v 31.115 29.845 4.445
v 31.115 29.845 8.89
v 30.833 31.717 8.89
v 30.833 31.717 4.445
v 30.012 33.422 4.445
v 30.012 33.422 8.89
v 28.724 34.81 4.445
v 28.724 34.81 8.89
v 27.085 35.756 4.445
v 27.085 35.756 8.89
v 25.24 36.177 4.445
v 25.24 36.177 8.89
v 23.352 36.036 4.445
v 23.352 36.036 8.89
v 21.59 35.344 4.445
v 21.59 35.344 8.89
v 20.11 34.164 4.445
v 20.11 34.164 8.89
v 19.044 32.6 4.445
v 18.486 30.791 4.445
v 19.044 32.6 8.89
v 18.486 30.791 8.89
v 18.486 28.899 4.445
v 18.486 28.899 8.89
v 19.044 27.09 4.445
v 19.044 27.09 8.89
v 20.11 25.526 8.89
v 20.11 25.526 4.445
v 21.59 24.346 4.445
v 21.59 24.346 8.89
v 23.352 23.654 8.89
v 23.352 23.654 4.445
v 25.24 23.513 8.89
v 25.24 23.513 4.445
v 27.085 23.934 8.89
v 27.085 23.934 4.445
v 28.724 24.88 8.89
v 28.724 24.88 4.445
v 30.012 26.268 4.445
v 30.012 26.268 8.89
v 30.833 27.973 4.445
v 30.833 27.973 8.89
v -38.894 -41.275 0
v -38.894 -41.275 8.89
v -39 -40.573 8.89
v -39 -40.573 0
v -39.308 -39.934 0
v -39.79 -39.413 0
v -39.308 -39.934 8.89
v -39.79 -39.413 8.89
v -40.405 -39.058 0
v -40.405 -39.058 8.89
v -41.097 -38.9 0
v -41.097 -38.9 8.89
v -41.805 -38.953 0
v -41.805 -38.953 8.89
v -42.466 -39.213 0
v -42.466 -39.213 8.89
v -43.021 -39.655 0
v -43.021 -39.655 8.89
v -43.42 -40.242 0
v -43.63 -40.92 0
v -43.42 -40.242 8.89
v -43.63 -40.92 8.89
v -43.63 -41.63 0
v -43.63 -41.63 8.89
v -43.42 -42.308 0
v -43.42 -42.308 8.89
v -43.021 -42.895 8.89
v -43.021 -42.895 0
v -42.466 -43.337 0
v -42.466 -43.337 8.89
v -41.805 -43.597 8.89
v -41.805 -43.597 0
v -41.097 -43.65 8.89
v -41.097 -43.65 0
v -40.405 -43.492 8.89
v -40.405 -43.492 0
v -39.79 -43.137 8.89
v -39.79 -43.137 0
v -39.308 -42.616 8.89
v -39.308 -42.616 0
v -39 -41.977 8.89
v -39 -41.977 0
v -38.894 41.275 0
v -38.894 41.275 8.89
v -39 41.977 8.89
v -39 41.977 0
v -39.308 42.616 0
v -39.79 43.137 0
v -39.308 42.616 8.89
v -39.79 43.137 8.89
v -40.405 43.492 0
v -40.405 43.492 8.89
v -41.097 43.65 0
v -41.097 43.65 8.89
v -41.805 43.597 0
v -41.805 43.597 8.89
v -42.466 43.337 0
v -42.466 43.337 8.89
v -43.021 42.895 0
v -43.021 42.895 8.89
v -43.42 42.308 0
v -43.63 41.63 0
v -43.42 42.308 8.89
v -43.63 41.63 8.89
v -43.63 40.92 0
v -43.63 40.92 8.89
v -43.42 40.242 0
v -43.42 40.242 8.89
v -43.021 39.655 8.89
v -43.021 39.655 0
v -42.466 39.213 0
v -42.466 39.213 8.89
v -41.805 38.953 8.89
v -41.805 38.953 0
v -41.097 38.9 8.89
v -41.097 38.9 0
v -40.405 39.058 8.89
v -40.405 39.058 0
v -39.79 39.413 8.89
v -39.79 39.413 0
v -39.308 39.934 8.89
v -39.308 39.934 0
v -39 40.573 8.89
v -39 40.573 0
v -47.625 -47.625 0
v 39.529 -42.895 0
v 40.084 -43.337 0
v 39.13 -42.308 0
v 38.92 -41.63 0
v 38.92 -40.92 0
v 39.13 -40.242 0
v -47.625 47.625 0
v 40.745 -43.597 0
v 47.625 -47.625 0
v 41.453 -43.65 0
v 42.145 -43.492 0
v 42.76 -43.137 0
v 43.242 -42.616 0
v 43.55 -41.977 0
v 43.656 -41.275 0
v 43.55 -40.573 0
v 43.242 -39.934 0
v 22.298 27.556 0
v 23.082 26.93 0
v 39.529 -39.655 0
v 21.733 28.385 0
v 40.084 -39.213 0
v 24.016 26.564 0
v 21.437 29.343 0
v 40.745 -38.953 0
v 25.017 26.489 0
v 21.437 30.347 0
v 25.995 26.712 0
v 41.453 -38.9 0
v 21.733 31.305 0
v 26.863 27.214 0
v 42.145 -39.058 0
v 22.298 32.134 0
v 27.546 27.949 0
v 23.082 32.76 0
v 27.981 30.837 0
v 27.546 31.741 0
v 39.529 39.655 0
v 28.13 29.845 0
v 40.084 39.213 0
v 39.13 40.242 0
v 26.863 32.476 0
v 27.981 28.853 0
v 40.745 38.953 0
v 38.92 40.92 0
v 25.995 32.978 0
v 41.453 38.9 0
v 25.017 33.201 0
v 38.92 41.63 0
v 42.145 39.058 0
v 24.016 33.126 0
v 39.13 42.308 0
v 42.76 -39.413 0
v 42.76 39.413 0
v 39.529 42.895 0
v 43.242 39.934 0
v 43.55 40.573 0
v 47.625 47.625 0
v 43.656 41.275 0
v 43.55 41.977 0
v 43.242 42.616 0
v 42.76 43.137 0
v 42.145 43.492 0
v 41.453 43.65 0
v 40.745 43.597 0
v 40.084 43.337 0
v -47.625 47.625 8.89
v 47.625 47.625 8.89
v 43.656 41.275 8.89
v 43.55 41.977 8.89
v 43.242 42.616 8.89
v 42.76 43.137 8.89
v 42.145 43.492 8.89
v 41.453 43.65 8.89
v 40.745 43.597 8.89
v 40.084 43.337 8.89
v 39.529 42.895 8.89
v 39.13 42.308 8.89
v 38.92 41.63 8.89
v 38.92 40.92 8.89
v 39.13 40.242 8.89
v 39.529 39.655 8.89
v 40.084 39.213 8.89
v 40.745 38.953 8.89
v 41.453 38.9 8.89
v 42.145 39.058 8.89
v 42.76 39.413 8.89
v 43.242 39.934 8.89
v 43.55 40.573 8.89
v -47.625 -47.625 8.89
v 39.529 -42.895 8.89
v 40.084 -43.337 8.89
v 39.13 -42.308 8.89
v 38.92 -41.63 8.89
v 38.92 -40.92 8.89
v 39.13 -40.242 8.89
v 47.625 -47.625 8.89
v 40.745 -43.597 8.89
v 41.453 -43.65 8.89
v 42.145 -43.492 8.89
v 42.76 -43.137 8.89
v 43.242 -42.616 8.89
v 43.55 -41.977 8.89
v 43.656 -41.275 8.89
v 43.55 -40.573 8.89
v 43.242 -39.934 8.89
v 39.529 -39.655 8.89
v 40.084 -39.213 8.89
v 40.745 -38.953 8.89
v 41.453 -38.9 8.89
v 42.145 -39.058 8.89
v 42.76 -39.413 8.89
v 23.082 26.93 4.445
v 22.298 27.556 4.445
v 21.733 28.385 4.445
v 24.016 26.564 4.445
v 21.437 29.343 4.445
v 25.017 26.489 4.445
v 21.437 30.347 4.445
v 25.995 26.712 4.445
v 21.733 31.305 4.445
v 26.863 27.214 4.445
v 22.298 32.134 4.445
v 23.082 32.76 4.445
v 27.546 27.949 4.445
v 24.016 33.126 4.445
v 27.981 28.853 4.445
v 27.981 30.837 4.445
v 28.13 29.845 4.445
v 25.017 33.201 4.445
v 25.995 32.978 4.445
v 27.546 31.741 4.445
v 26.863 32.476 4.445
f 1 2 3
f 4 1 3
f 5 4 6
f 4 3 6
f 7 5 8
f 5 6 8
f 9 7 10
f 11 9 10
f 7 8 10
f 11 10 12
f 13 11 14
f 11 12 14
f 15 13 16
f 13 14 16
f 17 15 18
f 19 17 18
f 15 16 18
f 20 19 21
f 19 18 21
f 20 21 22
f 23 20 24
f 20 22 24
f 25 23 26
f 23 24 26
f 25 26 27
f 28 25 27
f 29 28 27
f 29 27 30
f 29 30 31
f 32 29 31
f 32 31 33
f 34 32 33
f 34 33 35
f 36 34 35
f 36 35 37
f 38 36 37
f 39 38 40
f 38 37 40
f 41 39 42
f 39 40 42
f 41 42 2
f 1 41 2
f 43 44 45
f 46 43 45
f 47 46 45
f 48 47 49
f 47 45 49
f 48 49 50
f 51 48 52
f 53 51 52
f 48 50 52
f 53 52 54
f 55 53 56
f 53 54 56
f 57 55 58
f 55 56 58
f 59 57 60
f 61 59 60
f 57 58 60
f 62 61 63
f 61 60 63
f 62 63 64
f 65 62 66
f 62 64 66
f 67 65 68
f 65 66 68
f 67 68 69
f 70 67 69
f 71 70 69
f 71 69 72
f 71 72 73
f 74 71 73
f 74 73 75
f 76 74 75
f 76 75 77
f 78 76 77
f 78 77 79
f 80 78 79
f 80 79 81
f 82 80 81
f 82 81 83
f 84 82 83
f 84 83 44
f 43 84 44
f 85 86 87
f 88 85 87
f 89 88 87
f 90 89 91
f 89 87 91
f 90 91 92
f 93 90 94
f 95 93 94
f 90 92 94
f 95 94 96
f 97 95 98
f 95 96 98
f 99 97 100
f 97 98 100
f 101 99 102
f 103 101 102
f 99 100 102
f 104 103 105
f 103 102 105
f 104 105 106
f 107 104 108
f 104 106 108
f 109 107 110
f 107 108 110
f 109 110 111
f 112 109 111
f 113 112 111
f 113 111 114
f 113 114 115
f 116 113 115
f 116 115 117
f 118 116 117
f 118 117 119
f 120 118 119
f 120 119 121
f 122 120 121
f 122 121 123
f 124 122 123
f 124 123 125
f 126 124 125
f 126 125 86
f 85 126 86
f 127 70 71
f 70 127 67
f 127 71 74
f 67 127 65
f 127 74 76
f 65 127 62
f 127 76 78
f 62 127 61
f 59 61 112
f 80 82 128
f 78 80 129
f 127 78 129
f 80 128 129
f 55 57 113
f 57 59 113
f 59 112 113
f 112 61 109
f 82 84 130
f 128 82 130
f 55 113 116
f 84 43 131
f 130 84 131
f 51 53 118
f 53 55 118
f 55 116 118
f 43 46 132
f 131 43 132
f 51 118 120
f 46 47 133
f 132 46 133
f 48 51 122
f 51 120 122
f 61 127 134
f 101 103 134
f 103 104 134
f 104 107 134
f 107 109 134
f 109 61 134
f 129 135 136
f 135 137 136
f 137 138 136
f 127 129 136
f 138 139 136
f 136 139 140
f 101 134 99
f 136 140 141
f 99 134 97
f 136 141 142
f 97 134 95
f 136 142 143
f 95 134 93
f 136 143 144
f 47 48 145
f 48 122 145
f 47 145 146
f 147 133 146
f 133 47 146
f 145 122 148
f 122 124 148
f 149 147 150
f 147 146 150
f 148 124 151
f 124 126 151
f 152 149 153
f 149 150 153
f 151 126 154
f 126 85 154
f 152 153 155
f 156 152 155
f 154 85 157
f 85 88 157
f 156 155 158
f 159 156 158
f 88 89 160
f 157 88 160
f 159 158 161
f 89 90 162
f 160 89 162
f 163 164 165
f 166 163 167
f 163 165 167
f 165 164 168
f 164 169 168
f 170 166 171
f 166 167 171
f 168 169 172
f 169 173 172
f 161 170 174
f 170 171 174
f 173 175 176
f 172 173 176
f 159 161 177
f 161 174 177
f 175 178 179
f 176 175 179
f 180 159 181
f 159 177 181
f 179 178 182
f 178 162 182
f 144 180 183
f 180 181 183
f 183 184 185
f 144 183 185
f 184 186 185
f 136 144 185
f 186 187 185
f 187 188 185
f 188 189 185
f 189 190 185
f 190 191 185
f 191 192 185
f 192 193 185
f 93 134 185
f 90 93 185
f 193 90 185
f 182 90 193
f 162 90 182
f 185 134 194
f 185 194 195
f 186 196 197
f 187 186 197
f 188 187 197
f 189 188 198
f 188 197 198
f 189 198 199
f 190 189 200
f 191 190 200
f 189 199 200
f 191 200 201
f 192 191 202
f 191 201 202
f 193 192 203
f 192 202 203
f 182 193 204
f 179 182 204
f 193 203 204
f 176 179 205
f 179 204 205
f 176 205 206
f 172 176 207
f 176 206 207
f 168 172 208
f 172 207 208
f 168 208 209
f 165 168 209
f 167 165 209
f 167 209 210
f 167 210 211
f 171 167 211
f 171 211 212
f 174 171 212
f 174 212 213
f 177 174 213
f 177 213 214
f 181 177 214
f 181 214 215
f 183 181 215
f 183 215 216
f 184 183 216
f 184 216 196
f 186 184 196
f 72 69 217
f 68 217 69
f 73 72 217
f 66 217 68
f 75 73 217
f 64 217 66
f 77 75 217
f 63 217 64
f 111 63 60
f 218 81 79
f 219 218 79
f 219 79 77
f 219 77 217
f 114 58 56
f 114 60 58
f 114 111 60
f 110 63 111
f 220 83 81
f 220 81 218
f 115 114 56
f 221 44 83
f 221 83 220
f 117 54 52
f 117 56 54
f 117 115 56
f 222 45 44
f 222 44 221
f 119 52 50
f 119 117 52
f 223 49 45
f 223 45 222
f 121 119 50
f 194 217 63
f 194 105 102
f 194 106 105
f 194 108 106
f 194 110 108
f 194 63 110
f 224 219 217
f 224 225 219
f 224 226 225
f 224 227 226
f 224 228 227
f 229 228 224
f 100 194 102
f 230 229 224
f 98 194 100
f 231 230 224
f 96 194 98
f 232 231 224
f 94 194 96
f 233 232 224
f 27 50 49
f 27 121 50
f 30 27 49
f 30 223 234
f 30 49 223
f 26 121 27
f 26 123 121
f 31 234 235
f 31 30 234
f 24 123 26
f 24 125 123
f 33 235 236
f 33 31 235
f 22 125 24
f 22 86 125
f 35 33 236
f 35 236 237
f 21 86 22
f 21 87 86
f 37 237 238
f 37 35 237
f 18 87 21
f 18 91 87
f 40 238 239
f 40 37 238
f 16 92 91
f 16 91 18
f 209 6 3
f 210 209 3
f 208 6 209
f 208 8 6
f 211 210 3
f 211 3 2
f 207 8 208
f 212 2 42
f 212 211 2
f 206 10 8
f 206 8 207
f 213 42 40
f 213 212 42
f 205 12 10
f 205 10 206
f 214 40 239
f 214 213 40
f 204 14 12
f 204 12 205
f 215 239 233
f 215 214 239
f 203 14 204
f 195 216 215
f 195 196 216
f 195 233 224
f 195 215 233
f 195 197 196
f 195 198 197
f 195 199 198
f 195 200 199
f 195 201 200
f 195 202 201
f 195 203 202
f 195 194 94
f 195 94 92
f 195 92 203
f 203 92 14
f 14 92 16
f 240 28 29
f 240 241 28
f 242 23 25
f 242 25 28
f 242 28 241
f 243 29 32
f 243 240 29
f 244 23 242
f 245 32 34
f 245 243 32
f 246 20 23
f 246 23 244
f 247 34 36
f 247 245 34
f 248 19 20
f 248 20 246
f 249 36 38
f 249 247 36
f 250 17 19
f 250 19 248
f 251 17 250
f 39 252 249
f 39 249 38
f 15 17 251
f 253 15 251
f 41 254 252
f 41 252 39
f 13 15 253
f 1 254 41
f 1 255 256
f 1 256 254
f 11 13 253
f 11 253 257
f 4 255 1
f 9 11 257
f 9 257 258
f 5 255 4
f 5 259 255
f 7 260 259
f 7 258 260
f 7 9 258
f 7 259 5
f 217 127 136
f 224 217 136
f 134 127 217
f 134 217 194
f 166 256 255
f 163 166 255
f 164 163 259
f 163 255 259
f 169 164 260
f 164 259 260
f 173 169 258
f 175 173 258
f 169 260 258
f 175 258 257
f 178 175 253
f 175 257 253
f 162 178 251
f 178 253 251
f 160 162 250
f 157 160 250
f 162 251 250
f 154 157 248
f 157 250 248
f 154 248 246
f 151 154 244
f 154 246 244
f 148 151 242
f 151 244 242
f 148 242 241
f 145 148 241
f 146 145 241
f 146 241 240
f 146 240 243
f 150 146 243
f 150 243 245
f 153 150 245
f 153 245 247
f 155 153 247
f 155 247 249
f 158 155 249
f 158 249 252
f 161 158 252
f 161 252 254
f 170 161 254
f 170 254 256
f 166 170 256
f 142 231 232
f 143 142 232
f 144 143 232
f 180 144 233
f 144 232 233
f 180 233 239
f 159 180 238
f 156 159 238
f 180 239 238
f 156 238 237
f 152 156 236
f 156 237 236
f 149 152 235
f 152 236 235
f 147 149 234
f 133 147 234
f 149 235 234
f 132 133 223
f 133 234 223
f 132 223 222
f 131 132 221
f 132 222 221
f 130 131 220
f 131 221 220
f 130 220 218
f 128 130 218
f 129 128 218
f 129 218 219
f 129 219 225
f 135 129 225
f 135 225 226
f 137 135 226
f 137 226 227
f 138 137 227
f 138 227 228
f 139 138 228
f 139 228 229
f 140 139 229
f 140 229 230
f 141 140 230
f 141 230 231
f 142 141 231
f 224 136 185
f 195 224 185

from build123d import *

# Parameters (mm, degrees)
SKETCH1_W           = 95.25
SKETCH1_H           = 95.25
BOSS_EXTRUDE1_DEPTH = 8.89
SKETCH2_OUTSIDE_W   = 124.25
SKETCH2_OUTSIDE_H   = 124.25
SKETCH2_OUTSIDE_W_2 = 95.25
SKETCH2_OUTSIDE_H_2 = 95.25
SKETCH2_OUTSIDE_R   = 2.38125
CUT_EXTRUDE2_DEPTH  = 9.89
SKETCH3_R           = 6.35
CUT_EXTRUDE3_DEPTH  = 4.445
SKETCH4_R           = 3.3655
CUT_EXTRUDE4_DEPTH  = 5.445


with BuildPart() as part:
    # Sketch1 → Boss-Extrude1 (new body)
    with BuildSketch(Plane.XY):
        Rectangle(SKETCH1_W, SKETCH1_H)
    extrude(amount=BOSS_EXTRUDE1_DEPTH)

    # Sketch2 outside → Cut-Extrude2 (cut, through all)
    with BuildSketch(Plane.XY.offset(8.89)):
        Rectangle(SKETCH2_OUTSIDE_W, SKETCH2_OUTSIDE_H)
        Rectangle(SKETCH2_OUTSIDE_W_2, SKETCH2_OUTSIDE_H_2, mode=Mode.SUBTRACT)
        with Locations((-41.275, 41.275)):
            Circle(SKETCH2_OUTSIDE_R)
        with Locations((41.275, 41.275)):
            Circle(SKETCH2_OUTSIDE_R)
        with Locations((41.275, -41.275)):
            Circle(SKETCH2_OUTSIDE_R)
        with Locations((-41.275, -41.275)):
            Circle(SKETCH2_OUTSIDE_R)
    extrude(amount=-CUT_EXTRUDE2_DEPTH, mode=Mode.SUBTRACT)

    # Sketch3 → Cut-Extrude3 (cut)
    with BuildSketch(Plane.XY.offset(8.89)):
        with Locations((24.765, 29.845)):
            Circle(SKETCH3_R)
    extrude(amount=-CUT_EXTRUDE3_DEPTH, mode=Mode.SUBTRACT)

    # Sketch4 → Cut-Extrude4 (cut, through all)
    with BuildSketch(Plane.XY.offset(4.445)):
        with Locations((24.765, 29.845)):
            Circle(SKETCH4_R)
    extrude(amount=-CUT_EXTRUDE4_DEPTH, mode=Mode.SUBTRACT)


solid = part.part
